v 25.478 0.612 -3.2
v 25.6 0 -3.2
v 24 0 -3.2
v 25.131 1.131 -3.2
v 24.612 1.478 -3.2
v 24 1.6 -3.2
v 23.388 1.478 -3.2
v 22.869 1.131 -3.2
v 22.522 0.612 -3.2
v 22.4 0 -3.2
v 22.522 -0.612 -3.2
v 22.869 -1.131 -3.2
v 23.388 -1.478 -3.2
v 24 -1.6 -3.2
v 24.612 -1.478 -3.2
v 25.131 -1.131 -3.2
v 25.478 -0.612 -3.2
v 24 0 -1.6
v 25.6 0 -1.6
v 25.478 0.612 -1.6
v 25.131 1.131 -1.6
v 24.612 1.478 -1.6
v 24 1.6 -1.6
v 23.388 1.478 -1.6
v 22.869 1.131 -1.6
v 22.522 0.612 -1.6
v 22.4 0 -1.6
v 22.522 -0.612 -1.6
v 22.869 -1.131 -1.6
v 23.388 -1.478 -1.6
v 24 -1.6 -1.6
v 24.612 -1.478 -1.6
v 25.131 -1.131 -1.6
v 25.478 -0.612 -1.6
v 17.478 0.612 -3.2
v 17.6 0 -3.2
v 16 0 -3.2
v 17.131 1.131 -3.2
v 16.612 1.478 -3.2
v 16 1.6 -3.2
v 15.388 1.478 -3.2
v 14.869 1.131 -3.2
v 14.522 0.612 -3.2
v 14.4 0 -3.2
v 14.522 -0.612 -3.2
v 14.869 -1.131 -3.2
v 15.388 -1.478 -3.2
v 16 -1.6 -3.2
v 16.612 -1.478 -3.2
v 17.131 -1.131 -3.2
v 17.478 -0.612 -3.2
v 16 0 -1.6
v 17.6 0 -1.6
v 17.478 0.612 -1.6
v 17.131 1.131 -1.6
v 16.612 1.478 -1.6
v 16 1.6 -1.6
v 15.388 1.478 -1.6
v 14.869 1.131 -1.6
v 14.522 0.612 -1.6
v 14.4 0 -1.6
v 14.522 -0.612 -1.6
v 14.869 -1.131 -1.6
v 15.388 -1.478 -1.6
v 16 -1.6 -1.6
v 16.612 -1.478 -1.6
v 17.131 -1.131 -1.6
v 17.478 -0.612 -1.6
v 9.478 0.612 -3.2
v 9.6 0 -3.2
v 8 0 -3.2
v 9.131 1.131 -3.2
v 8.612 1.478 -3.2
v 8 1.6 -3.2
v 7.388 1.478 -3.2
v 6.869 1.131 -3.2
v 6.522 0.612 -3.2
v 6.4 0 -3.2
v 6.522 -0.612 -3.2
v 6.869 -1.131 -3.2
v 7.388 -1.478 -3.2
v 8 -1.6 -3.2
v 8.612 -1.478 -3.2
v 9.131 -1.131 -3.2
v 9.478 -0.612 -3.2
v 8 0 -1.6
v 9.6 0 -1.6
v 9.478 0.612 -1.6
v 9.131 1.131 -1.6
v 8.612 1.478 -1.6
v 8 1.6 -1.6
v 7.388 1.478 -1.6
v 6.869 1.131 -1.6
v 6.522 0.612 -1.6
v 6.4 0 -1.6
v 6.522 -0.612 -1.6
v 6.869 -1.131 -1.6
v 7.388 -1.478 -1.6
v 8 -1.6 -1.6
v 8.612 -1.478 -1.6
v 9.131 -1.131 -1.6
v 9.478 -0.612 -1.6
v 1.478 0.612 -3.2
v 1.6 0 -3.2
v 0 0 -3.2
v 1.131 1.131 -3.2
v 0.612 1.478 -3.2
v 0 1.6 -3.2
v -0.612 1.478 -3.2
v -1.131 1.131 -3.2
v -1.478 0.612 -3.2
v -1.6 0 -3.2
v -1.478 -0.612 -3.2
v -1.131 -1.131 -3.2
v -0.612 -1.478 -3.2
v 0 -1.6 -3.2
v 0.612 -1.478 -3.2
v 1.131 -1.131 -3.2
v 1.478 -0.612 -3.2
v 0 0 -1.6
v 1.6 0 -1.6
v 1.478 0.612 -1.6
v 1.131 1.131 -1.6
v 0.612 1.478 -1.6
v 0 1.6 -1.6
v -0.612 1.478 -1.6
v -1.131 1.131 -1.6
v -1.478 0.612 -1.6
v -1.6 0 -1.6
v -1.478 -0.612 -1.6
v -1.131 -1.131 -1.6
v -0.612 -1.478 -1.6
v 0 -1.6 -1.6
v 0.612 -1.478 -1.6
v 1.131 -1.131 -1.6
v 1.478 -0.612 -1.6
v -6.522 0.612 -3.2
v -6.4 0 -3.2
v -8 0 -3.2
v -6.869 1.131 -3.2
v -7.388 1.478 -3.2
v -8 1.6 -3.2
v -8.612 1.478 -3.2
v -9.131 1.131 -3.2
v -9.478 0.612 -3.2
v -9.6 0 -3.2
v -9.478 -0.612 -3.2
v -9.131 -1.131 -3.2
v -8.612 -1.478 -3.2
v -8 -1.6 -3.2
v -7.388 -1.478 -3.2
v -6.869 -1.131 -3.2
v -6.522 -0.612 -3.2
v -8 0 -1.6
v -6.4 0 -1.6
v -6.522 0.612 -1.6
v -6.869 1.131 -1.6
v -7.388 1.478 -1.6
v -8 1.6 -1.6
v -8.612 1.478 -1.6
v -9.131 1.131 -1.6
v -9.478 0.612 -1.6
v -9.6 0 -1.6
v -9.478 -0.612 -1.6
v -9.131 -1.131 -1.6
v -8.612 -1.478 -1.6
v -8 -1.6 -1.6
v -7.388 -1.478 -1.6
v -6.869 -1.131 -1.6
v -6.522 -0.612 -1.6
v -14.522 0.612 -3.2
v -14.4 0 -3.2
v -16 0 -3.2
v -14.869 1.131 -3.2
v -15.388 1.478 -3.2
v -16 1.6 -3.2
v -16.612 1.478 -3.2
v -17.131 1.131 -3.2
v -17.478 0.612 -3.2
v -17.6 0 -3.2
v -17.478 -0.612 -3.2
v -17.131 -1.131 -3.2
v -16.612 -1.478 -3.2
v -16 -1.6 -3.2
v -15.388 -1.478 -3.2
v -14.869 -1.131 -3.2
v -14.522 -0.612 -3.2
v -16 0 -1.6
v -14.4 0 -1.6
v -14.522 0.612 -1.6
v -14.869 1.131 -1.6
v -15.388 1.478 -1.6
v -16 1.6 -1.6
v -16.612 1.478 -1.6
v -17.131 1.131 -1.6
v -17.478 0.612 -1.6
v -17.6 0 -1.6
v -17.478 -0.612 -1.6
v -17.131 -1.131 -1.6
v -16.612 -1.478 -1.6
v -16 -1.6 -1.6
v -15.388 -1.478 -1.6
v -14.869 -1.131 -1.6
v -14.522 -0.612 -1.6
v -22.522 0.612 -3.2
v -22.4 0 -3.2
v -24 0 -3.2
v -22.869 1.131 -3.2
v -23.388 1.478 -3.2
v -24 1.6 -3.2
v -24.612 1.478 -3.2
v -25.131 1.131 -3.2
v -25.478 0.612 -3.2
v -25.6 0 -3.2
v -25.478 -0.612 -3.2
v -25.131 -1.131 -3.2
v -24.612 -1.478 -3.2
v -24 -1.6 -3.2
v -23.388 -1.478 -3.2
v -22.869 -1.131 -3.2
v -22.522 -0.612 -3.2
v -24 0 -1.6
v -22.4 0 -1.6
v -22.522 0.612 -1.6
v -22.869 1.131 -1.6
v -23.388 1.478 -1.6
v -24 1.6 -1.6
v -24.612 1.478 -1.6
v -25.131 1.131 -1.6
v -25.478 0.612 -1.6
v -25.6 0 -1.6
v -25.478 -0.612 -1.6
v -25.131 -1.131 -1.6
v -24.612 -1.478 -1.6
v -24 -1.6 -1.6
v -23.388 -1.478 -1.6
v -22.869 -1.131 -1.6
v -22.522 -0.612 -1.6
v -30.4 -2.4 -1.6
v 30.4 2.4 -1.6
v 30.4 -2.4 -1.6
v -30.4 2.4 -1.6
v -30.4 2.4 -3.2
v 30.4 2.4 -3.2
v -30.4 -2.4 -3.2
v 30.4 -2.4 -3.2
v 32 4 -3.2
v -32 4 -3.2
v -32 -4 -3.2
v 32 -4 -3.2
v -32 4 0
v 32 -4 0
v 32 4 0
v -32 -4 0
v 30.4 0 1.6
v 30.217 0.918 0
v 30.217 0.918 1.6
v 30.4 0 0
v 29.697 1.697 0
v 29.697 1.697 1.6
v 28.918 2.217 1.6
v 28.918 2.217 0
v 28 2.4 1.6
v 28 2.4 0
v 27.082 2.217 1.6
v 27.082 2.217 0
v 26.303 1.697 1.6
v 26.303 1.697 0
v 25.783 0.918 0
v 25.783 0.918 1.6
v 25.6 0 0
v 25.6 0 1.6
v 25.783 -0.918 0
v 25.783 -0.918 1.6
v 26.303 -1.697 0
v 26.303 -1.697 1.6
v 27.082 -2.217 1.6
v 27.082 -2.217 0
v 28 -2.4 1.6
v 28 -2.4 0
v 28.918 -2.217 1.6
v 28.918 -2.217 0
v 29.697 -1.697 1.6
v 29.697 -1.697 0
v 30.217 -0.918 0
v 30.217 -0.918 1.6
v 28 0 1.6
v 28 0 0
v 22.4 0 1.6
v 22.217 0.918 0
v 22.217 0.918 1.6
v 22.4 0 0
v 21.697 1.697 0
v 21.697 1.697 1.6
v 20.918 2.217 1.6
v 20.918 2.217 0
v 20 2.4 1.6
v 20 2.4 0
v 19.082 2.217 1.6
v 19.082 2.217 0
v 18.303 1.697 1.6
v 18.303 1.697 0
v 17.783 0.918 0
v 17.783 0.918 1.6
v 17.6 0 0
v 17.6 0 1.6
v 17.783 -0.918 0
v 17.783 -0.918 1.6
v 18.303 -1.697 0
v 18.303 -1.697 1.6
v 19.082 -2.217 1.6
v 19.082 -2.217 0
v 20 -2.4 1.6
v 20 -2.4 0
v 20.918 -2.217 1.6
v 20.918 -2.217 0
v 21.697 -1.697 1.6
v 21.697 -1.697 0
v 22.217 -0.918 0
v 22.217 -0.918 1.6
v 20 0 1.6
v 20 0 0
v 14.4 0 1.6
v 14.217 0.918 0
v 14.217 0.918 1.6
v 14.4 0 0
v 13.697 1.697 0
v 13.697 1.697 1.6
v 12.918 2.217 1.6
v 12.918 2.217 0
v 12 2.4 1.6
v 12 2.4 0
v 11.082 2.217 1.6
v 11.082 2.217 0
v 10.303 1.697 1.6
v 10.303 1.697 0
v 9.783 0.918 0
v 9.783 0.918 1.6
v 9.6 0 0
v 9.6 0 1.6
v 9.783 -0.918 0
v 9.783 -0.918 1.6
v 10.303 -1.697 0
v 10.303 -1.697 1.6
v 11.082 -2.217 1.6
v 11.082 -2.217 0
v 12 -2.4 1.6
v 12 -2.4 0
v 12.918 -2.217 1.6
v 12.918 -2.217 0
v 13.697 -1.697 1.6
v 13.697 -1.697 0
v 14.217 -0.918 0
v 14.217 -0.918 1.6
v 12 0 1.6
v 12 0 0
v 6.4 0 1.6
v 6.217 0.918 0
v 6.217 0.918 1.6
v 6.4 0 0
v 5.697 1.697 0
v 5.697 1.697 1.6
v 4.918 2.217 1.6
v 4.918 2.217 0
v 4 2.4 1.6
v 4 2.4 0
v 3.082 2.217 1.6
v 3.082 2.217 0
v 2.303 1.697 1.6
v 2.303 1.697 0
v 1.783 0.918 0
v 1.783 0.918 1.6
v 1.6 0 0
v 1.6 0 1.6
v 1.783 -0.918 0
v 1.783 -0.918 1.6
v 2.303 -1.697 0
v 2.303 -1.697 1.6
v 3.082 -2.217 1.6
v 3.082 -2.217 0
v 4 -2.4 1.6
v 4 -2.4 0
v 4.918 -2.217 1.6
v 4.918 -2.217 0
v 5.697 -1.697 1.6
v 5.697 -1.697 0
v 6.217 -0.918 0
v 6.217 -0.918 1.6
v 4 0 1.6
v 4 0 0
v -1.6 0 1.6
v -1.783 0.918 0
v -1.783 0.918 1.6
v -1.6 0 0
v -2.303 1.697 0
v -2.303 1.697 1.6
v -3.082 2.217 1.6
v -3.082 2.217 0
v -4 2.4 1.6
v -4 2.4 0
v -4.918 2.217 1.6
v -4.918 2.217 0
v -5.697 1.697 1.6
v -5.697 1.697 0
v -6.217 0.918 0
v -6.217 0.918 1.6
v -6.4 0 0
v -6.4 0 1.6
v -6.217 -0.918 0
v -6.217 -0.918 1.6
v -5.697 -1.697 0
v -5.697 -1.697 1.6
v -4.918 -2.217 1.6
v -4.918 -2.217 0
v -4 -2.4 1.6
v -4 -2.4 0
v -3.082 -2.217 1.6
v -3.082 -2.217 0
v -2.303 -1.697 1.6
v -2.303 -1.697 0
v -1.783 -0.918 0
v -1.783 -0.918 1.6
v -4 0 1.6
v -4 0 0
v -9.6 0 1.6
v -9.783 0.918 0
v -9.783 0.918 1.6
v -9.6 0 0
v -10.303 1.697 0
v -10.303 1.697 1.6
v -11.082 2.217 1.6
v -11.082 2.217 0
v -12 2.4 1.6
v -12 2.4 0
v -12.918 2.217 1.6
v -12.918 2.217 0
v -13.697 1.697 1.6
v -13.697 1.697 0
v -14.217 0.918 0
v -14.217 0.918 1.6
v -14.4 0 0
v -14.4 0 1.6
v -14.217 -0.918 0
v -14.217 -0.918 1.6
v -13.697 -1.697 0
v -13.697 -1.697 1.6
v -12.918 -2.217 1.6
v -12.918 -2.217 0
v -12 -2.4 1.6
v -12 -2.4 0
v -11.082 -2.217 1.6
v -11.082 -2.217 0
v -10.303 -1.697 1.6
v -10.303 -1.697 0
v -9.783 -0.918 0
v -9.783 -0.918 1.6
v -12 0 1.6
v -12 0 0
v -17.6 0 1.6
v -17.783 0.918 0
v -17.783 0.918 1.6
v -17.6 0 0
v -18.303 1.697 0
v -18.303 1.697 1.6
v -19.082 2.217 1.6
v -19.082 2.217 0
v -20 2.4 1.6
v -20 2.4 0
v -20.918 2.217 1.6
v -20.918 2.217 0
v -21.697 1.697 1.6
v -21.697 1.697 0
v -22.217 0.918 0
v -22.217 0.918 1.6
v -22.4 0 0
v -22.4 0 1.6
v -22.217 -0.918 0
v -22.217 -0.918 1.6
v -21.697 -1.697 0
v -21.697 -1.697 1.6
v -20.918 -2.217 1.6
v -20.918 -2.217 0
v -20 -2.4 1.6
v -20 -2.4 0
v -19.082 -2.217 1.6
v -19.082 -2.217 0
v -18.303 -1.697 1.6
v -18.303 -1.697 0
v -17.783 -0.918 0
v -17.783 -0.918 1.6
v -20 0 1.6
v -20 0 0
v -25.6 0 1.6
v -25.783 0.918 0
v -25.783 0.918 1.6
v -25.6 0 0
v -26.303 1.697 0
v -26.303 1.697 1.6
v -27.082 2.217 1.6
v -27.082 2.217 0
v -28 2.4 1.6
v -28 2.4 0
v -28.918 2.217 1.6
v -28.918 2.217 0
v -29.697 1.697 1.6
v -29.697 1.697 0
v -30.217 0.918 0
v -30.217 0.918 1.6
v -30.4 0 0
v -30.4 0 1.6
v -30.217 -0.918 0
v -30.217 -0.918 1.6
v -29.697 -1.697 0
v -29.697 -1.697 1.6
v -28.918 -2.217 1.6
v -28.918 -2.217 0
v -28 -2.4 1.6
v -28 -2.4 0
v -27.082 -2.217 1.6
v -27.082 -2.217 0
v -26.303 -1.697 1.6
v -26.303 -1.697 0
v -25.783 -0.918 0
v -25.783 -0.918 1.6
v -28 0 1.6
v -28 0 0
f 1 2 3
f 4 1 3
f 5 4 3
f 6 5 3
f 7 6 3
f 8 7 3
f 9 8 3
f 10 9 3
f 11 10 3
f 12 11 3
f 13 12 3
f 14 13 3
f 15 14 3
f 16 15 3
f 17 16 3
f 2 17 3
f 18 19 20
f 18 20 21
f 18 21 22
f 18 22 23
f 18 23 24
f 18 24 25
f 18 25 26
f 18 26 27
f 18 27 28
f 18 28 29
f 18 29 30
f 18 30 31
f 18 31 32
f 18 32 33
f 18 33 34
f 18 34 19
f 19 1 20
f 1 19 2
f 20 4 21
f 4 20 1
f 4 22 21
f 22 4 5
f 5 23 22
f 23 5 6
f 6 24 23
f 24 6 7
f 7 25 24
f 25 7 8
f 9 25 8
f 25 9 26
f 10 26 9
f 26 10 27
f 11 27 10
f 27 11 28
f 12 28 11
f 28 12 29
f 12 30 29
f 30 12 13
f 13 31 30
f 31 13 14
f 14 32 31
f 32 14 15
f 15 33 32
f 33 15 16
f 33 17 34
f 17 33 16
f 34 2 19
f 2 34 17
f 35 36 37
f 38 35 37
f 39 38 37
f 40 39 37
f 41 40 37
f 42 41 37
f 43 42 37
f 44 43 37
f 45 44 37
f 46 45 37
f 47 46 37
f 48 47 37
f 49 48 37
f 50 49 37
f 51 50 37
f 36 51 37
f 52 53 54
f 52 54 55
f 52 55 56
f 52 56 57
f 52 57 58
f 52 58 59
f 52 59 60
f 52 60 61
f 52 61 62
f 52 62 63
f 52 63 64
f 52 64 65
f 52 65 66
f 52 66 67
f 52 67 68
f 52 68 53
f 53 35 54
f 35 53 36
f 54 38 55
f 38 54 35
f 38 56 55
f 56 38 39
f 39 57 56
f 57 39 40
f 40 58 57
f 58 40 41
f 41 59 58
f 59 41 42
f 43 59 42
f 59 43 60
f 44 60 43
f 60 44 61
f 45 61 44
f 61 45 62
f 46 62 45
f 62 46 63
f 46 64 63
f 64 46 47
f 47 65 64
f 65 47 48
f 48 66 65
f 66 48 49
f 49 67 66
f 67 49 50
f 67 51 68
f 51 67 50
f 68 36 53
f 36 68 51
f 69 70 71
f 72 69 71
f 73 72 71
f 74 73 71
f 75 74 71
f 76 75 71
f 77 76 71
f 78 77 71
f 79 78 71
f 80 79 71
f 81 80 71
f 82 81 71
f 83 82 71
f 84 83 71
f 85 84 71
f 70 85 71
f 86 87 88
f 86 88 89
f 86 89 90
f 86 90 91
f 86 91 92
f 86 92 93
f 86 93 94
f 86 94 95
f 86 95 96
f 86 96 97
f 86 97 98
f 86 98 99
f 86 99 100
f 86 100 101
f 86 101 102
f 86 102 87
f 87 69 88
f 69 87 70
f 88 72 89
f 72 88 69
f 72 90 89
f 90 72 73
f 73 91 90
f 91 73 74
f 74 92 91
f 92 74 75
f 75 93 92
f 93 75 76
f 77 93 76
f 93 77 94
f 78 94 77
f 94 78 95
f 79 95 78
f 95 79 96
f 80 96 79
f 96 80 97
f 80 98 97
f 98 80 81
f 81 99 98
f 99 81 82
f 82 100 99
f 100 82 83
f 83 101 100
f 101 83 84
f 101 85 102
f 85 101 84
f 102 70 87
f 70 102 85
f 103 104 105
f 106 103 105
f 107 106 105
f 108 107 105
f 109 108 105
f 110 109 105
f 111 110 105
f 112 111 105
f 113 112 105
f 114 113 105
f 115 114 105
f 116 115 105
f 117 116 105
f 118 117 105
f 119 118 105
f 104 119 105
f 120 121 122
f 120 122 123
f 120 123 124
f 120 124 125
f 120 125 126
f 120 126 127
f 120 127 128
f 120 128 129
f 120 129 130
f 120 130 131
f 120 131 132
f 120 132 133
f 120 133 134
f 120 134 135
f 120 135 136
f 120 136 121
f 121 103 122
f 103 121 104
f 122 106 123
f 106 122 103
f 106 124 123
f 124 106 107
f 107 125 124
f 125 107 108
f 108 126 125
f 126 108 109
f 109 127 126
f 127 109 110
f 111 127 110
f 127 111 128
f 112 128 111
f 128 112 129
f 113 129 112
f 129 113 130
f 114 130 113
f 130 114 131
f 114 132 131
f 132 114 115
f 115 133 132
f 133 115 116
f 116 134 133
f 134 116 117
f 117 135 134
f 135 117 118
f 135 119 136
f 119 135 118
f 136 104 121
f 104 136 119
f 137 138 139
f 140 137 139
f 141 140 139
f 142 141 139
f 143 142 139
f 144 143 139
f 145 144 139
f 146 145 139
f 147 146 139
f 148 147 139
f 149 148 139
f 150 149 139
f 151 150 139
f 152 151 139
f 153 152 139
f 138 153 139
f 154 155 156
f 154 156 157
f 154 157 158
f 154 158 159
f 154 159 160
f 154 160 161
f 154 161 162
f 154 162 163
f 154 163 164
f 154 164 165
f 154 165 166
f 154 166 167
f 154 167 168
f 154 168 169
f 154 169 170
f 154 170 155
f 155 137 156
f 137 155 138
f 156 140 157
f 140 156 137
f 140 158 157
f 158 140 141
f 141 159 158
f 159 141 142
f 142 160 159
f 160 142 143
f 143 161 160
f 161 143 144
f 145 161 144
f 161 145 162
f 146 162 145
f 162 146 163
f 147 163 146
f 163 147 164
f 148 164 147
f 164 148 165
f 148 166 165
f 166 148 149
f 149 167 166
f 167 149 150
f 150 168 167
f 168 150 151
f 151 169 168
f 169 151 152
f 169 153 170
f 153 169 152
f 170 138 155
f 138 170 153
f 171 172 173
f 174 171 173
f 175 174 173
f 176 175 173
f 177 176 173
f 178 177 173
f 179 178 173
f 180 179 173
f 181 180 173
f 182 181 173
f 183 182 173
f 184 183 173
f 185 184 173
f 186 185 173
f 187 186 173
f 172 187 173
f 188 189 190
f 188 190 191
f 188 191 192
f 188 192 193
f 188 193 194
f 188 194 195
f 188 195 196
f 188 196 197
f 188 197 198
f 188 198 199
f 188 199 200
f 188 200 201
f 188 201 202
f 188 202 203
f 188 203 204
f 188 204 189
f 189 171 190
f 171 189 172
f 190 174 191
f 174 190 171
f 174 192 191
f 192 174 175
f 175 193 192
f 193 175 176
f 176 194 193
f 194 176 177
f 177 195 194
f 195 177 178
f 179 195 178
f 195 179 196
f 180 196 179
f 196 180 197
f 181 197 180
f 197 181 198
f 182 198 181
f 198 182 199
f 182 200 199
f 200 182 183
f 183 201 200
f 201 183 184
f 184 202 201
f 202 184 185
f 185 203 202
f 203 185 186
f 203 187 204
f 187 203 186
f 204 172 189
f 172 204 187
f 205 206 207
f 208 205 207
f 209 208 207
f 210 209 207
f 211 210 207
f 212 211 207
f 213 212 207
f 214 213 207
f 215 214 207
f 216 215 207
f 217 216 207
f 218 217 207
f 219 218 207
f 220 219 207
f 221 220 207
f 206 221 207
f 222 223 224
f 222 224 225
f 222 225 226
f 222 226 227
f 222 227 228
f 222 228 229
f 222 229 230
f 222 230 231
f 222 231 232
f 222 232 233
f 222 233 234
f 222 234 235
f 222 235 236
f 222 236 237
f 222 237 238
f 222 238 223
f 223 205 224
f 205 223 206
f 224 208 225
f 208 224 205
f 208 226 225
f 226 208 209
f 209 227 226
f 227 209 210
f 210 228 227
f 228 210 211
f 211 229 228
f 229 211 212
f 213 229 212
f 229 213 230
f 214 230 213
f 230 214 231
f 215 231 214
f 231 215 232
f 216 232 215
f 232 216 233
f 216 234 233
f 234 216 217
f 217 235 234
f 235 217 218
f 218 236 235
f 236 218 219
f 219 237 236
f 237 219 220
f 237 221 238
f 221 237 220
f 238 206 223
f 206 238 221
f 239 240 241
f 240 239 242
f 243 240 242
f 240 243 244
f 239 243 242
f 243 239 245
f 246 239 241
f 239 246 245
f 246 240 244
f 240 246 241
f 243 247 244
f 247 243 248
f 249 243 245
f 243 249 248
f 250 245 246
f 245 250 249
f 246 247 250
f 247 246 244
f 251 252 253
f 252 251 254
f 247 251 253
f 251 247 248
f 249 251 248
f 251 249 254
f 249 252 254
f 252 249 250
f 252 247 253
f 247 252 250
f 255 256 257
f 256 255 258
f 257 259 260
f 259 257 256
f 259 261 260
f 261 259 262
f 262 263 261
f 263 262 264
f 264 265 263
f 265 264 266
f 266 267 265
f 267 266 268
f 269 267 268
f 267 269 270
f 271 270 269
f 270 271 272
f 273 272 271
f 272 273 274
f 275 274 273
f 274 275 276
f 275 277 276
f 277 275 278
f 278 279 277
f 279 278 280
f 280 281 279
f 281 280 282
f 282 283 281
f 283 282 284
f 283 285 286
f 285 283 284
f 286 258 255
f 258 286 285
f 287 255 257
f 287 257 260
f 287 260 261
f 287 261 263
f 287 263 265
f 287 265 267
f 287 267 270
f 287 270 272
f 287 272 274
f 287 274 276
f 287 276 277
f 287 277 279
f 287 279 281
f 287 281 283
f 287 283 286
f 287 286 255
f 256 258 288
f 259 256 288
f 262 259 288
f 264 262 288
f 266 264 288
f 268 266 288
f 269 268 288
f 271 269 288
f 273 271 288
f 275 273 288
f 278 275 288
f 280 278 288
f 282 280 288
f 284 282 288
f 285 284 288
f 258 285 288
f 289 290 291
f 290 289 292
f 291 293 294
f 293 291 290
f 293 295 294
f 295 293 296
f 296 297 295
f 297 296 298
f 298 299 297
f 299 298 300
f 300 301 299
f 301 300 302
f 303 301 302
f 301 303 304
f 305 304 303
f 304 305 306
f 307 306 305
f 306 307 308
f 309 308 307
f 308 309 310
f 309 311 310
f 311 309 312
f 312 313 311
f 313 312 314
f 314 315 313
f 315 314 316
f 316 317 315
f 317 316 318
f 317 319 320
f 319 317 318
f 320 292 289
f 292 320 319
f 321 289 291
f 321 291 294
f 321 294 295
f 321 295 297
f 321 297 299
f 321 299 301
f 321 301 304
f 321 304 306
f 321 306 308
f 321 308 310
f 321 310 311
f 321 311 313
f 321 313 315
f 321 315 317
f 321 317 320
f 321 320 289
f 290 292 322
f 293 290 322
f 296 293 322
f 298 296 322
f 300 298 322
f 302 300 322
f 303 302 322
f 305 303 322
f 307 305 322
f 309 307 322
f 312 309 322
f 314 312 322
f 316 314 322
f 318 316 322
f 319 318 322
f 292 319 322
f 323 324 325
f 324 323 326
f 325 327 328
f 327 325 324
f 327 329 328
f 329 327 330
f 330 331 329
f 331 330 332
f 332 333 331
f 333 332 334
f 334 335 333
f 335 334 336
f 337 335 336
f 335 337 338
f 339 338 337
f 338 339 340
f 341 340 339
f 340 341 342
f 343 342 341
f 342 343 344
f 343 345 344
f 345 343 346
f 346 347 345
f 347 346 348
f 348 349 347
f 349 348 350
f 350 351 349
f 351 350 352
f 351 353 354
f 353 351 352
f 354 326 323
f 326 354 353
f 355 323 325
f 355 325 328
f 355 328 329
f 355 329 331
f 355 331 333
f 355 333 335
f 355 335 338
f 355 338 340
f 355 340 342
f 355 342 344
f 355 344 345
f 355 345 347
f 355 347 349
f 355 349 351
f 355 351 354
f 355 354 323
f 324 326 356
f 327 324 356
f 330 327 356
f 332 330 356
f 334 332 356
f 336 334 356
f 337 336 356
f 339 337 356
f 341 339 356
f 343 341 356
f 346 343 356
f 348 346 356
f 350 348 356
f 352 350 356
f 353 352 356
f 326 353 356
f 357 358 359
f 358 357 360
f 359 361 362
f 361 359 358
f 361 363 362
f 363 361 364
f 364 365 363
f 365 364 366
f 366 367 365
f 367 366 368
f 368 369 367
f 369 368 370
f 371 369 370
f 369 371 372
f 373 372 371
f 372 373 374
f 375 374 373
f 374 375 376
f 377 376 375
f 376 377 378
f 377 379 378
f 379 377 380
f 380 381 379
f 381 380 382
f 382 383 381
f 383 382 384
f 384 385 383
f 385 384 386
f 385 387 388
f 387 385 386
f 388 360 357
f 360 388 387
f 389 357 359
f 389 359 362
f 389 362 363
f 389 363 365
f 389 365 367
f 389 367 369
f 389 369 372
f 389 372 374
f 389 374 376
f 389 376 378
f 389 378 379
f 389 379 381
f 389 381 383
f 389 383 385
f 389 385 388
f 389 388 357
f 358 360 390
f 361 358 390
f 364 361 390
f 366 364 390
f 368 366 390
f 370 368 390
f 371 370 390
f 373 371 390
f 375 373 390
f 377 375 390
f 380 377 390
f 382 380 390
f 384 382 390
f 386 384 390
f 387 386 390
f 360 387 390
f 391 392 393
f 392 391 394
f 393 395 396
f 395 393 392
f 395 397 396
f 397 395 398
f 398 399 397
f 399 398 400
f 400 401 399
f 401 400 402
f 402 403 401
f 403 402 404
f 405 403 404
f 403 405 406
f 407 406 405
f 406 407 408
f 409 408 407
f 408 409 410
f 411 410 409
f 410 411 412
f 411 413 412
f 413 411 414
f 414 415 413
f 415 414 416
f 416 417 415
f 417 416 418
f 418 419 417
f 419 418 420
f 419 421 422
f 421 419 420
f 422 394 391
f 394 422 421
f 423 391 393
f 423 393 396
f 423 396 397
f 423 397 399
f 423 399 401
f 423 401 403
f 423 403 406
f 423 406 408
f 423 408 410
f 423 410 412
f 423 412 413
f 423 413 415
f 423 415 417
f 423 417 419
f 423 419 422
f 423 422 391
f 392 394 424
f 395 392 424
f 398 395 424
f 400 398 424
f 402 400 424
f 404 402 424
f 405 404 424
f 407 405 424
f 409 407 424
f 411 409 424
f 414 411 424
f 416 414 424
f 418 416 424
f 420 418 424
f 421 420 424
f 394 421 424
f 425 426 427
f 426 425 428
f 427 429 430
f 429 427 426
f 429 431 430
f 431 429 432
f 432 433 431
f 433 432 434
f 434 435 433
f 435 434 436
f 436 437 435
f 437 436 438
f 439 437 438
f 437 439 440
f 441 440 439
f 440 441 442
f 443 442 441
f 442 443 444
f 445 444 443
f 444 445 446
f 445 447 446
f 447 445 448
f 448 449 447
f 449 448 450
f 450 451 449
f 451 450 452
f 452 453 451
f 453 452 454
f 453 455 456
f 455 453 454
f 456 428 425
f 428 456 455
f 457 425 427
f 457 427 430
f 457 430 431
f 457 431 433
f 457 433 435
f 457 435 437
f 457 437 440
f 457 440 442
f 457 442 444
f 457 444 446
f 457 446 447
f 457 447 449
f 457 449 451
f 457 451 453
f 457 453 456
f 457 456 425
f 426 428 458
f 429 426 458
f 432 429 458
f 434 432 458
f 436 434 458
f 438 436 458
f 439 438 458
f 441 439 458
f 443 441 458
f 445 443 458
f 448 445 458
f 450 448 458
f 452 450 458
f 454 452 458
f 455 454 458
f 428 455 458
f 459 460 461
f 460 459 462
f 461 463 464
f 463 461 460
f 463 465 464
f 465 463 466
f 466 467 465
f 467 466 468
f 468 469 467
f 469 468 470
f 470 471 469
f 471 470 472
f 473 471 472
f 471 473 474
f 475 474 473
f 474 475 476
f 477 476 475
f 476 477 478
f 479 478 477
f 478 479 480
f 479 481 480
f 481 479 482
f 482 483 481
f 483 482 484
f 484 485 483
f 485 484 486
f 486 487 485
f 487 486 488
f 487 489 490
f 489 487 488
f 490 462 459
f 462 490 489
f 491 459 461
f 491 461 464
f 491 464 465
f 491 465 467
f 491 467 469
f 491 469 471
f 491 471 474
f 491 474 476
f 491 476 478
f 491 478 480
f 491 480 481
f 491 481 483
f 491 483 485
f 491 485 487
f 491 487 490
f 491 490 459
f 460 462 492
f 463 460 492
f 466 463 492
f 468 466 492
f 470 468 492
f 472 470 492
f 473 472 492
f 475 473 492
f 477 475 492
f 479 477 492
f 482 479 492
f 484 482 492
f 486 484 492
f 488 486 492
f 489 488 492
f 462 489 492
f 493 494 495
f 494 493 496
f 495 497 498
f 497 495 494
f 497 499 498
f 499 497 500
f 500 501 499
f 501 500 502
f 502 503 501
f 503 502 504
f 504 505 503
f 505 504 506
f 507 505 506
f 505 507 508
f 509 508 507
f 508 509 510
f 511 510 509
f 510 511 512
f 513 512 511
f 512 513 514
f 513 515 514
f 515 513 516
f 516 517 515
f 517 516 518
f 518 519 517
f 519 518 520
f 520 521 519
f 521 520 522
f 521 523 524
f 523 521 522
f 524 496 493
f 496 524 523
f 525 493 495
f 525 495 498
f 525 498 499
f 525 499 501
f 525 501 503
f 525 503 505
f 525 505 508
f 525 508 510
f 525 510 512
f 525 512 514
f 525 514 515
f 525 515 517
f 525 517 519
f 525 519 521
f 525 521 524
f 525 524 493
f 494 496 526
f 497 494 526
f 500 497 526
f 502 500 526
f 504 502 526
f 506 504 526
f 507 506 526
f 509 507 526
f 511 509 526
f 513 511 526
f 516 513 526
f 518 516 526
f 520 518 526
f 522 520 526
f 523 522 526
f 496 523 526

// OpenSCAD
// file: ../p/4-4edge.scad
use <../lib.scad>
function ldraw_lib__4_4edge() = [
// 0 Circle 1.0
// 0 Name: 4-4edge.dat
// 0 Author: James Jessiman
// 0 !LDRAW_ORG Primitive UPDATE 2017-01
// 0 !LICENSE Licensed under CC BY 2.0 and CC BY 4.0 : see CAreadme.txt
// 
// 0 BFC CERTIFY CCW
  [0,"BFC","CERTIFY"],
  [0,"BFC","CCW"],
// 
// 0 !HISTORY 1998-12-15 [PTadmin] Official Update 1998-10
// 0 !HISTORY 2005-12-28 [PTadmin] Official Update 2005-01
// 0 !HISTORY 2007-06-24 [PTadmin] Header formatted for Contributor Agreement
// 0 !HISTORY 2008-07-01 [PTadmin] Official Update 2008-01
// 0 !HISTORY 2017-01-15 [Steffen] BFCed
// 0 !HISTORY 2017-12-30 [PTadmin] Official Update 2017-01
// 
// 
// 2 24 1 0 0 0.9239 0 0.3827
  [2,24,1,0,0,0.9239,0,0.3827],
// 2 24 0.9239 0 0.3827 0.7071 0 0.7071
  [2,24,0.9239,0,0.3827,0.7071,0,0.7071],
// 2 24 0.7071 0 0.7071 0.3827 0 0.9239
  [2,24,0.7071,0,0.7071,0.3827,0,0.9239],
// 2 24 0.3827 0 0.9239 0 0 1
  [2,24,0.3827,0,0.9239,0,0,1],
// 2 24 0 0 1 -0.3827 0 0.9239
  [2,24,0,0,1,-0.3827,0,0.9239],
// 2 24 -0.3827 0 0.9239 -0.7071 0 0.7071
  [2,24,-0.3827,0,0.9239,-0.7071,0,0.7071],
// 2 24 -0.7071 0 0.7071 -0.9239 0 0.3827
  [2,24,-0.7071,0,0.7071,-0.9239,0,0.3827],
// 2 24 -0.9239 0 0.3827 -1 0 -0
  [2,24,-0.9239,0,0.3827,-1,0,-0],
// 2 24 -1 0 -0 -0.9239 0 -0.3827
  [2,24,-1,0,-0,-0.9239,0,-0.3827],
// 2 24 -0.9239 0 -0.3827 -0.7071 0 -0.7071
  [2,24,-0.9239,0,-0.3827,-0.7071,0,-0.7071],
// 2 24 -0.7071 0 -0.7071 -0.3827 0 -0.9239
  [2,24,-0.7071,0,-0.7071,-0.3827,0,-0.9239],
// 2 24 -0.3827 0 -0.9239 0 0 -1
  [2,24,-0.3827,0,-0.9239,0,0,-1],
// 2 24 0 0 -1 0.3827 0 -0.9239
  [2,24,0,0,-1,0.3827,0,-0.9239],
// 2 24 0.3827 0 -0.9239 0.7071 0 -0.7071
  [2,24,0.3827,0,-0.9239,0.7071,0,-0.7071],
// 2 24 0.7071 0 -0.7071 0.9239 0 -0.3827
  [2,24,0.7071,0,-0.7071,0.9239,0,-0.3827],
// 2 24 0.9239 0 -0.3827 1 0 0
  [2,24,0.9239,0,-0.3827,1,0,0],
];
module ldraw_lib__4_4edge(step=0, col=false, unit=2/5, alt=false, line=0.2, solid=!$preview)
    makepoly(ldraw_lib__4_4edge(), step=step, col=col, unit=unit, alt=alt, line=line, solid=solid);
ldraw_lib__4_4edge(line=0.2);
// file: ../p/4-4disc.scad
use <../lib.scad>
function ldraw_lib__4_4disc() = [
// 0 Disc 1.0
// 0 Name: 4-4disc.dat
// 0 Author: James Jessiman
// 0 !LDRAW_ORG Primitive UPDATE 2002-02
// 0 !LICENSE Licensed under CC BY 2.0 and CC BY 4.0 : see CAreadme.txt
// 
// 0 BFC CERTIFY CCW
  [0,"BFC","CERTIFY"],
  [0,"BFC","CCW"],
// 
// 0 !HISTORY 1998-12-15 [PTadmin] Official Update 1998-10
// 0 !HISTORY 2002-03-23 [sbliss] Added BFC statement
// 0 !HISTORY 2002-04-25 [PTadmin] Official Update 2002-02
// 0 !HISTORY 2007-06-24 [PTadmin] Header formatted for Contributor Agreement
// 0 !HISTORY 2008-07-01 [PTadmin] Official Update 2008-01
// 
// 
// 3 16 0 0 0 1 0 0 0.9239 0 0.3827
  [3,16,0,0,0,1,0,0,0.9239,0,0.3827],
// 3 16 0 0 0 0.9239 0 0.3827 0.7071 0 0.7071
  [3,16,0,0,0,0.9239,0,0.3827,0.7071,0,0.7071],
// 3 16 0 0 0 0.7071 0 0.7071 0.3827 0 0.9239
  [3,16,0,0,0,0.7071,0,0.7071,0.3827,0,0.9239],
// 3 16 0 0 0 0.3827 0 0.9239 0 0 1
  [3,16,0,0,0,0.3827,0,0.9239,0,0,1],
// 3 16 0 0 0 0 0 1 -0.3827 0 0.9239
  [3,16,0,0,0,0,0,1,-0.3827,0,0.9239],
// 3 16 0 0 0 -0.3827 0 0.9239 -0.7071 0 0.7071
  [3,16,0,0,0,-0.3827,0,0.9239,-0.7071,0,0.7071],
// 3 16 0 0 0 -0.7071 0 0.7071 -0.9239 0 0.3827
  [3,16,0,0,0,-0.7071,0,0.7071,-0.9239,0,0.3827],
// 3 16 0 0 0 -0.9239 0 0.3827 -1 0 -0
  [3,16,0,0,0,-0.9239,0,0.3827,-1,0,-0],
// 3 16 0 0 0 -1 0 -0 -0.9239 0 -0.3827
  [3,16,0,0,0,-1,0,-0,-0.9239,0,-0.3827],
// 3 16 0 0 0 -0.9239 0 -0.3827 -0.7071 0 -0.7071
  [3,16,0,0,0,-0.9239,0,-0.3827,-0.7071,0,-0.7071],
// 3 16 0 0 0 -0.7071 0 -0.7071 -0.3827 0 -0.9239
  [3,16,0,0,0,-0.7071,0,-0.7071,-0.3827,0,-0.9239],
// 3 16 0 0 0 -0.3827 0 -0.9239 0 0 -1
  [3,16,0,0,0,-0.3827,0,-0.9239,0,0,-1],
// 3 16 0 0 0 0 0 -1 0.3827 0 -0.9239
  [3,16,0,0,0,0,0,-1,0.3827,0,-0.9239],
// 3 16 0 0 0 0.3827 0 -0.9239 0.7071 0 -0.7071
  [3,16,0,0,0,0.3827,0,-0.9239,0.7071,0,-0.7071],
// 3 16 0 0 0 0.7071 0 -0.7071 0.9239 0 -0.3827
  [3,16,0,0,0,0.7071,0,-0.7071,0.9239,0,-0.3827],
// 3 16 0 0 0 0.9239 0 -0.3827 1 0 0
  [3,16,0,0,0,0.9239,0,-0.3827,1,0,0],
// 0
];
module ldraw_lib__4_4disc(step=0, col=false, unit=2/5, alt=false, line=0.2, solid=!$preview)
    makepoly(ldraw_lib__4_4disc(), step=step, col=col, unit=unit, alt=alt, line=line, solid=solid);
ldraw_lib__4_4disc(line=0.2);
// file: ../p/4-4cyli.scad
use <../lib.scad>
$fa=1; $fs=0.2;
function ldraw_lib__4_4cyli(realsolid=false) = [
// 0 Cylinder 1.0
// 0 Name: 4-4cyli.dat
// 0 Author: James Jessiman
// 0 !LDRAW_ORG Primitive UPDATE 2005-01
// 0 !LICENSE Licensed under CC BY 2.0 and CC BY 4.0 : see CAreadme.txt
// 
// 0 BFC CERTIFY CCW
  [0,"BFC","CERTIFY"],
  [0,"BFC","CCW"],
// 
// 0 !HISTORY 1998-12-15 [PTadmin] Official Update 1998-10
// 0 !HISTORY 2002-03-23 [sbliss] Added BFC statement; merged headers from files in distributions LDraw 0.27 and Complete.
// 0 !HISTORY 2002-04-25 [PTadmin] Official Update 2002-02
// 0 !HISTORY 2004-12-14 [guyvivan] BFC CCW
// 0 !HISTORY 2005-12-28 [PTadmin] Official Update 2005-01
// 0 !HISTORY 2007-06-24 [PTadmin] Header formatted for Contributor Agreement
// 0 !HISTORY 2008-07-01 [PTadmin] Official Update 2008-01
// 
// 
// 4 16 1 1 0 0.9239 1 0.3827 0.9239 0 0.3827 1 0 0
  [4,16,1,1,0,0.9239,1,0.3827,0.9239,0,0.3827,1,0,0],
// 5 24 1 0 0 1 1 0 0.9239 0 0.3827 0.9239 0 -0.3827
  [5,24,1,0,0,1,1,0,0.9239,0,0.3827,0.9239,0,-0.3827],
// 4 16 0.9239 1 0.3827 0.7071 1 0.7071 0.7071 0 0.7071 0.9239 0 0.3827
  [4,16,0.9239,1,0.3827,0.7071,1,0.7071,0.7071,0,0.7071,0.9239,0,0.3827],
// 5 24 0.9239 0 0.3827 0.9239 1 0.3827 0.7071 0 0.7071 1 0 0
  [5,24,0.9239,0,0.3827,0.9239,1,0.3827,0.7071,0,0.7071,1,0,0],
// 4 16 0.7071 1 0.7071 0.3827 1 0.9239 0.3827 0 0.9239 0.7071 0 0.7071
  [4,16,0.7071,1,0.7071,0.3827,1,0.9239,0.3827,0,0.9239,0.7071,0,0.7071],
// 5 24 0.7071 0 0.7071 0.7071 1 0.7071 0.3827 0 0.9239 0.9239 0 0.3827
  [5,24,0.7071,0,0.7071,0.7071,1,0.7071,0.3827,0,0.9239,0.9239,0,0.3827],
// 4 16 0.3827 1 0.9239 0 1 1 0 0 1 0.3827 0 0.9239
  [4,16,0.3827,1,0.9239,0,1,1,0,0,1,0.3827,0,0.9239],
// 5 24 0.3827 0 0.9239 0.3827 1 0.9239 0 0 1 0.7071 0 0.7071
  [5,24,0.3827,0,0.9239,0.3827,1,0.9239,0,0,1,0.7071,0,0.7071],
// 4 16 0 1 1 -0.3827 1 0.9239 -0.3827 0 0.9239 0 0 1
  [4,16,0,1,1,-0.3827,1,0.9239,-0.3827,0,0.9239,0,0,1],
// 5 24 0 0 1 0 1 1 -0.3827 0 0.9239 0.3827 0 0.9239
  [5,24,0,0,1,0,1,1,-0.3827,0,0.9239,0.3827,0,0.9239],
// 4 16 -0.3827 1 0.9239 -0.7071 1 0.7071 -0.7071 0 0.7071 -0.3827 0 0.9239
  [4,16,-0.3827,1,0.9239,-0.7071,1,0.7071,-0.7071,0,0.7071,-0.3827,0,0.9239],
// 5 24 -0.3827 0 0.9239 -0.3827 1 0.9239 -0.7071 0 0.7071 0 0 1
  [5,24,-0.3827,0,0.9239,-0.3827,1,0.9239,-0.7071,0,0.7071,0,0,1],
// 4 16 -0.7071 1 0.7071 -0.9239 1 0.3827 -0.9239 0 0.3827 -0.7071 0 0.7071
  [4,16,-0.7071,1,0.7071,-0.9239,1,0.3827,-0.9239,0,0.3827,-0.7071,0,0.7071],
// 5 24 -0.7071 0 0.7071 -0.7071 1 0.7071 -0.9239 0 0.3827 -0.3827 0 0.9239
  [5,24,-0.7071,0,0.7071,-0.7071,1,0.7071,-0.9239,0,0.3827,-0.3827,0,0.9239],
// 4 16 -0.9239 1 0.3827 -1 1 0 -1 0 0 -0.9239 0 0.3827
  [4,16,-0.9239,1,0.3827,-1,1,0,-1,0,0,-0.9239,0,0.3827],
// 5 24 -0.9239 0 0.3827 -0.9239 1 0.3827 -1 0 0 -0.7071 0 0.7071
  [5,24,-0.9239,0,0.3827,-0.9239,1,0.3827,-1,0,0,-0.7071,0,0.7071],
// 4 16 -1 1 0 -0.9239 1 -0.3827 -0.9239 0 -0.3827 -1 0 0
  [4,16,-1,1,0,-0.9239,1,-0.3827,-0.9239,0,-0.3827,-1,0,0],
// 5 24 -1 0 0 -1 1 0 -0.9239 0 -0.3827 -0.9239 0 0.3827
  [5,24,-1,0,0,-1,1,0,-0.9239,0,-0.3827,-0.9239,0,0.3827],
// 4 16 -0.9239 1 -0.3827 -0.7071 1 -0.7071 -0.7071 0 -0.7071 -0.9239 0 -0.3827
  [4,16,-0.9239,1,-0.3827,-0.7071,1,-0.7071,-0.7071,0,-0.7071,-0.9239,0,-0.3827],
// 5 24 -0.9239 0 -0.3827 -0.9239 1 -0.3827 -0.7071 0 -0.7071 -1 0 0
  [5,24,-0.9239,0,-0.3827,-0.9239,1,-0.3827,-0.7071,0,-0.7071,-1,0,0],
// 4 16 -0.7071 1 -0.7071 -0.3827 1 -0.9239 -0.3827 0 -0.9239 -0.7071 0 -0.7071
  [4,16,-0.7071,1,-0.7071,-0.3827,1,-0.9239,-0.3827,0,-0.9239,-0.7071,0,-0.7071],
// 5 24 -0.7071 0 -0.7071 -0.7071 1 -0.7071 -0.3827 0 -0.9239 -0.9239 0 -0.3827
  [5,24,-0.7071,0,-0.7071,-0.7071,1,-0.7071,-0.3827,0,-0.9239,-0.9239,0,-0.3827],
// 4 16 -0.3827 1 -0.9239 0 1 -1 0 0 -1 -0.3827 0 -0.9239
  [4,16,-0.3827,1,-0.9239,0,1,-1,0,0,-1,-0.3827,0,-0.9239],
// 5 24 -0.3827 0 -0.9239 -0.3827 1 -0.9239 0 0 -1 -0.7071 0 -0.7071
  [5,24,-0.3827,0,-0.9239,-0.3827,1,-0.9239,0,0,-1,-0.7071,0,-0.7071],
// 4 16 0 1 -1 0.3827 1 -0.9239 0.3827 0 -0.9239 0 0 -1
  [4,16,0,1,-1,0.3827,1,-0.9239,0.3827,0,-0.9239,0,0,-1],
// 5 24 0 0 -1 0 1 -1 0.3827 0 -0.9239 -0.3827 0 -0.9239
  [5,24,0,0,-1,0,1,-1,0.3827,0,-0.9239,-0.3827,0,-0.9239],
// 4 16 0.3827 1 -0.9239 0.7071 1 -0.7071 0.7071 0 -0.7071 0.3827 0 -0.9239
  [4,16,0.3827,1,-0.9239,0.7071,1,-0.7071,0.7071,0,-0.7071,0.3827,0,-0.9239],
// 5 24 0.3827 0 -0.9239 0.3827 1 -0.9239 0.7071 0 -0.7071 0 0 -1
  [5,24,0.3827,0,-0.9239,0.3827,1,-0.9239,0.7071,0,-0.7071,0,0,-1],
// 4 16 0.7071 1 -0.7071 0.9239 1 -0.3827 0.9239 0 -0.3827 0.7071 0 -0.7071
  [4,16,0.7071,1,-0.7071,0.9239,1,-0.3827,0.9239,0,-0.3827,0.7071,0,-0.7071],
// 5 24 0.7071 0 -0.7071 0.7071 1 -0.7071 0.9239 0 -0.3827 0.3827 0 -0.9239
  [5,24,0.7071,0,-0.7071,0.7071,1,-0.7071,0.9239,0,-0.3827,0.3827,0,-0.9239],
// 4 16 0.9239 1 -0.3827 1 1 0 1 0 0 0.9239 0 -0.3827
  [4,16,0.9239,1,-0.3827,1,1,0,1,0,0,0.9239,0,-0.3827],
// 5 24 0.9239 0 -0.3827 0.9239 1 -0.3827 1 0 0 0.7071 0 -0.7071
  [5,24,0.9239,0,-0.3827,0.9239,1,-0.3827,1,0,0,0.7071,0,-0.7071],
// 0
];
module ldraw_lib__4_4cyli(step=0, col=false, unit=2/5, alt=false, line=0.2, solid=!$preview)
    makepoly(ldraw_lib__4_4cyli(solid), step=step, col=col, unit=unit, alt=alt, line=line, solid=solid);
ldraw_lib__4_4cyli(line=0.2);
// file: ../p/stud3.scad
use <../lib.scad>
use <4-4cyli.scad>
use <4-4disc.scad>
use <4-4edge.scad>
function ldraw_lib__stud3() = [
// 0 Stud Tube Solid
// 0 Name: stud3.dat
// 0 Author: James Jessiman
// 0 !LDRAW_ORG Primitive UPDATE 2012-01
// 0 !LICENSE Licensed under CC BY 4.0 : see CAreadme.txt
// 
// 0 BFC CERTIFY CCW
  [0,"BFC","CERTIFY"],
  [0,"BFC","CCW"],
// 
// 0 !HISTORY 2002-04-04 [sbliss] Modified for BFC compliance
// 0 !HISTORY 2002-04-25 [PTadmin] Official Update 2002-02
// 0 !HISTORY 2007-06-24 [PTadmin] Header formatted for Contributor Agreement
// 0 !HISTORY 2008-07-01 [PTadmin] Official Update 2008-01
// 0 !HISTORY 2012-02-16 [Philo] Changed to CCW
// 0 !HISTORY 2012-03-30 [PTadmin] Official Update 2012-01
// 
// 
// 1 16 0 -4 0 4 0 0 0 1 0 0 0 4 4-4edge.dat
  [1,16,0,-4,0,4,0,0,0,1,0,0,0,4, ldraw_lib__4_4edge()],
// 1 16 0 0 0 4 0 0 0 1 0 0 0 4 4-4edge.dat
  [1,16,0,0,0,4,0,0,0,1,0,0,0,4, ldraw_lib__4_4edge()],
// 1 16 0 -4 0 4 0 0 0 1 0 0 0 4 4-4disc.dat
  [1,16,0,-4,0,4,0,0,0,1,0,0,0,4, ldraw_lib__4_4disc()],
  [-1,16,0,0,0,4,0,0,0,-1,0,0,0,4, ldraw_lib__4_4disc()],
// 1 16 0 -4 0 4 0 0 0 4 0 0 0 4 4-4cyli.dat
  [1,16,0,-4,0,4,0,0,0,4,0,0,0,4, ldraw_lib__4_4cyli()],
];
module ldraw_lib__stud3(step=0, col=false, unit=2/5, alt=false, line=0.2, solid=!$preview)
    makepoly(ldraw_lib__stud3(), step=step, col=col, unit=unit, alt=alt, line=line, solid=solid);
ldraw_lib__stud3(line=0.2);
// file: ../p/stud.scad
use <../lib.scad>
use <4-4cyli.scad>
use <4-4disc.scad>
use <4-4edge.scad>
function ldraw_lib__stud() = [
// 0 Stud
// 0 Name: stud.dat
// 0 Author: James Jessiman
// 0 !LDRAW_ORG Primitive UPDATE 2012-01
// 0 !LICENSE Licensed under CC BY 4.0 : see CAreadme.txt
// 
// 0 BFC CERTIFY CCW
  [0,"BFC","CERTIFY"],
  [0,"BFC","CCW"],
// 
// 0 !HISTORY 2002-04-04 [sbliss] Modified for BFC compliance
// 0 !HISTORY 2002-04-25 [PTadmin] Official Update 2002-02
// 0 !HISTORY 2007-06-24 [PTadmin] Header formatted for Contributor Agreement
// 0 !HISTORY 2008-07-01 [PTadmin] Official Update 2008-01
// 0 !HISTORY 2012-02-16 [Philo] Changed to CCW
// 0 !HISTORY 2012-03-30 [PTadmin] Official Update 2012-01
// 
// 
// 1 16 0 0 0 6 0 0 0 1 0 0 0 6 4-4edge.dat
  [1,16,0,0,0,6,0,0,0,1,0,0,0,6, ldraw_lib__4_4edge()],
// 1 16 0 -4 0 6 0 0 0 1 0 0 0 6 4-4edge.dat
  [1,16,0,-4,0,6,0,0,0,1,0,0,0,6, ldraw_lib__4_4edge()],
// 1 16 0 0 0 6 0 0 0 -4 0 0 0 6 4-4cyli.dat
  [1,16,0,0,0,6,0,0,0,-4,0,0,0,6, ldraw_lib__4_4cyli()],
// 1 16 0 -4 0 6 0 0 0 1 0 0 0 6 4-4disc.dat
  [1,16,0,-4,0,6,0,0,0,1,0,0,0,6, ldraw_lib__4_4disc()],
  [-1,16,0,0,0,6,0,0,0,-1,0,0,0,6, ldraw_lib__4_4disc()],
];
module ldraw_lib__stud(step=0, col=false, unit=2/5, alt=false, line=0.2, solid=!$preview)
    makepoly(ldraw_lib__stud(), step=step, col=col, unit=unit, alt=alt, line=line, solid=solid);
ldraw_lib__stud(line=0.2);
// file: ../p/box5.scad
use <../lib.scad>
function ldraw_lib__box5() = [
// 0 Box with 5 Faces and All Edges
// 0 Name: box5.dat
// 0 Author: James Jessiman
// 0 !LDRAW_ORG Primitive UPDATE 2012-01
// 0 !LICENSE Licensed under CC BY 2.0 and CC BY 4.0 : see CAreadme.txt
// 
// 0 BFC CERTIFY CCW
  [0,"BFC","CERTIFY"],
  [0,"BFC","CCW"],
// 
// 0 !HISTORY 2002-04-03 [sbliss] Modified for BFC compliance
// 0 !HISTORY 2002-04-25 [PTadmin] Official Update 2002-02
// 0 !HISTORY 2007-06-24 [PTadmin] Header formatted for Contributor Agreement
// 0 !HISTORY 2008-07-01 [PTadmin] Official Update 2008-01
// 0 !HISTORY 2012-02-16 [Philo] Changed to CCW
// 0 !HISTORY 2012-03-30 [PTadmin] Official Update 2012-01
// 
// 
// 2 24 1 1 1 -1 1 1
  [2,24,1,1,1,-1,1,1],
// 2 24 -1 1 1 -1 1 -1
  [2,24,-1,1,1,-1,1,-1],
// 2 24 -1 1 -1 1 1 -1
  [2,24,-1,1,-1,1,1,-1],
// 2 24 1 1 -1 1 1 1
  [2,24,1,1,-1,1,1,1],
// 2 24 1 0 1 -1 0 1
  [2,24,1,0,1,-1,0,1],
// 2 24 -1 0 1 -1 0 -1
  [2,24,-1,0,1,-1,0,-1],
// 2 24 -1 0 -1 1 0 -1
  [2,24,-1,0,-1,1,0,-1],
// 2 24 1 0 -1 1 0 1
  [2,24,1,0,-1,1,0,1],
// 2 24 1 0 1 1 1 1
  [2,24,1,0,1,1,1,1],
// 2 24 -1 0 1 -1 1 1
  [2,24,-1,0,1,-1,1,1],
// 2 24 1 0 -1 1 1 -1
  [2,24,1,0,-1,1,1,-1],
// 2 24 -1 0 -1 -1 1 -1
  [2,24,-1,0,-1,-1,1,-1],
// 4 16 -1 1 1 1 1 1 1 1 -1 -1 1 -1
  [4,16,-1,1,1,1,1,1,1,1,-1,-1,1,-1],
// 4 16 -1 1 1 -1 0 1 1 0 1 1 1 1
  [4,16,-1,1,1,-1,0,1,1,0,1,1,1,1],
// 4 16 -1 1 -1 -1 0 -1 -1 0 1 -1 1 1
  [4,16,-1,1,-1,-1,0,-1,-1,0,1,-1,1,1],
// 4 16 1 1 -1 1 0 -1 -1 0 -1 -1 1 -1
  [4,16,1,1,-1,1,0,-1,-1,0,-1,-1,1,-1],
// 4 16 1 1 1 1 0 1 1 0 -1 1 1 -1
  [4,16,1,1,1,1,0,1,1,0,-1,1,1,-1],
];
makepoly(ldraw_lib__box5(), line=0.2);
// file: 3460.scad
use <../lib.scad>
use <../p/box5.scad>
use <../p/stud.scad>
use <../p/stud3.scad>
function ldraw_lib__3460() = [
// 0 Plate  1 x  8
// 0 Name: 3460.dat
// 0 Author: James Jessiman
// 0 !LDRAW_ORG Part UPDATE 2004-04
// 0 !LICENSE Licensed under CC BY 2.0 and CC BY 4.0 : see CAreadme.txt
// 
// 0 BFC CERTIFY CCW
  [0,"BFC","CERTIFY"],
  [0,"BFC","CCW"],
// 
// 0 !HISTORY 2004-07-25 [guyvivan] Made BFC Compliant
// 0 !HISTORY 2004-11-06 [PTadmin] Official Update 2004-04
// 0 !HISTORY 2007-06-25 [PTadmin] Header formatted for Contributor Agreement
// 0 !HISTORY 2008-07-01 [PTadmin] Official Update 2008-01
// 
// 
// 1 16 60 4 0 1 0 0 0 -1 0 0 0 1 stud3.dat
  [1,16,60,4,0,1,0,0,0,-1,0,0,0,1, ldraw_lib__stud3()],
// 1 16 40 4 0 1 0 0 0 -1 0 0 0 1 stud3.dat
  [1,16,40,4,0,1,0,0,0,-1,0,0,0,1, ldraw_lib__stud3()],
// 1 16 20 4 0 1 0 0 0 -1 0 0 0 1 stud3.dat
  [1,16,20,4,0,1,0,0,0,-1,0,0,0,1, ldraw_lib__stud3()],
// 1 16 0 4 0 1 0 0 0 -1 0 0 0 1 stud3.dat
  [1,16,0,4,0,1,0,0,0,-1,0,0,0,1, ldraw_lib__stud3()],
// 1 16 -20 4 0 1 0 0 0 -1 0 0 0 1 stud3.dat
  [1,16,-20,4,0,1,0,0,0,-1,0,0,0,1, ldraw_lib__stud3()],
// 1 16 -40 4 0 1 0 0 0 -1 0 0 0 1 stud3.dat
  [1,16,-40,4,0,1,0,0,0,-1,0,0,0,1, ldraw_lib__stud3()],
// 1 16 -60 4 0 1 0 0 0 -1 0 0 0 1 stud3.dat
  [1,16,-60,4,0,1,0,0,0,-1,0,0,0,1, ldraw_lib__stud3()],
// 0 BFC INVERTNEXT
  [0,"BFC","INVERTNEXT"],
// 1 16 0 8 0 76 0 0 0 -4 0 0 0 6 box5.dat
  [1,16,0,8,0,76,0,0,0,-4,0,0,0,6, ldraw_lib__box5()],
// 4 16 80 8 10 76 8 6 -76 8 6 -80 8 10
  [4,16,80,8,10,76,8,6,-76,8,6,-80,8,10],
// 4 16 -80 8 10 -76 8 6 -76 8 -6 -80 8 -10
  [4,16,-80,8,10,-76,8,6,-76,8,-6,-80,8,-10],
// 4 16 -80 8 -10 -76 8 -6 76 8 -6 80 8 -10
  [4,16,-80,8,-10,-76,8,-6,76,8,-6,80,8,-10],
// 4 16 80 8 -10 76 8 -6 76 8 6 80 8 10
  [4,16,80,8,-10,76,8,-6,76,8,6,80,8,10],
// 1 16 0 8 0 80 0 0 0 -8 0 0 0 10 box5.dat
  [1,16,0,8,0,80,0,0,0,-8,0,0,0,10, ldraw_lib__box5()],
// 1 16 70 0 0 1 0 0 0 1 0 0 0 1 stud.dat
  [1,16,70,0,0,1,0,0,0,1,0,0,0,1, ldraw_lib__stud()],
// 1 16 50 0 0 1 0 0 0 1 0 0 0 1 stud.dat
  [1,16,50,0,0,1,0,0,0,1,0,0,0,1, ldraw_lib__stud()],
// 1 16 30 0 0 1 0 0 0 1 0 0 0 1 stud.dat
  [1,16,30,0,0,1,0,0,0,1,0,0,0,1, ldraw_lib__stud()],
// 1 16 10 0 0 1 0 0 0 1 0 0 0 1 stud.dat
  [1,16,10,0,0,1,0,0,0,1,0,0,0,1, ldraw_lib__stud()],
// 1 16 -10 0 0 1 0 0 0 1 0 0 0 1 stud.dat
  [1,16,-10,0,0,1,0,0,0,1,0,0,0,1, ldraw_lib__stud()],
// 1 16 -30 0 0 1 0 0 0 1 0 0 0 1 stud.dat
  [1,16,-30,0,0,1,0,0,0,1,0,0,0,1, ldraw_lib__stud()],
// 1 16 -50 0 0 1 0 0 0 1 0 0 0 1 stud.dat
  [1,16,-50,0,0,1,0,0,0,1,0,0,0,1, ldraw_lib__stud()],
// 1 16 -70 0 0 1 0 0 0 1 0 0 0 1 stud.dat
  [1,16,-70,0,0,1,0,0,0,1,0,0,0,1, ldraw_lib__stud()],
// 0
// 
];
makepoly(ldraw_lib__3460(), line=0.2);
// main file
use <../lib.scad>
use <3460.scad>
function ldraw_lib__4114324() = [
// 0 ~_Plate  1 x  8 Tan (Obsolete)
// 0 Name: 4114324.dat
// 0 Author: [PTadmin]
// 0 !LDRAW_ORG Part Physical_Colour UPDATE 2019-02
// 0 !LICENSE Licensed under CC BY 4.0 : see CAreadme.txt
// 
// 0 BFC CERTIFY CCW
  [0,"BFC","CERTIFY"],
  [0,"BFC","CCW"],
// 
// 0 !CATEGORY Obsolete
// 
// 0 !HISTORY 2010-12-31 [PTadmin] Official Update 2010-03
// 0 !HISTORY 2019-07-26 [Holly-Wood] Obsoleted per decision not to include physical colour parts
// 0 !HISTORY 2019-09-09 [PTadmin] Official Update 2019-02
// 
// 
// 0 // This file is a "shortcut" with the correct number for the actual
// 0 // colouring of the part (Tan).
// 
// 1 19 0 0 0 1 0 0 0 1 0 0 0 1 3460.dat
  [1,19,0,0,0,1,0,0,0,1,0,0,0,1, ldraw_lib__3460()],
];
module ldraw_lib__4114324(step=0, col=false, unit=2/5, alt=false, line=0.2, solid=!$preview)
    makepoly(ldraw_lib__4114324(), step=step, col=col, unit=unit, alt=alt, line=line, solid=solid);
ldraw_lib__4114324(line=0.2);
